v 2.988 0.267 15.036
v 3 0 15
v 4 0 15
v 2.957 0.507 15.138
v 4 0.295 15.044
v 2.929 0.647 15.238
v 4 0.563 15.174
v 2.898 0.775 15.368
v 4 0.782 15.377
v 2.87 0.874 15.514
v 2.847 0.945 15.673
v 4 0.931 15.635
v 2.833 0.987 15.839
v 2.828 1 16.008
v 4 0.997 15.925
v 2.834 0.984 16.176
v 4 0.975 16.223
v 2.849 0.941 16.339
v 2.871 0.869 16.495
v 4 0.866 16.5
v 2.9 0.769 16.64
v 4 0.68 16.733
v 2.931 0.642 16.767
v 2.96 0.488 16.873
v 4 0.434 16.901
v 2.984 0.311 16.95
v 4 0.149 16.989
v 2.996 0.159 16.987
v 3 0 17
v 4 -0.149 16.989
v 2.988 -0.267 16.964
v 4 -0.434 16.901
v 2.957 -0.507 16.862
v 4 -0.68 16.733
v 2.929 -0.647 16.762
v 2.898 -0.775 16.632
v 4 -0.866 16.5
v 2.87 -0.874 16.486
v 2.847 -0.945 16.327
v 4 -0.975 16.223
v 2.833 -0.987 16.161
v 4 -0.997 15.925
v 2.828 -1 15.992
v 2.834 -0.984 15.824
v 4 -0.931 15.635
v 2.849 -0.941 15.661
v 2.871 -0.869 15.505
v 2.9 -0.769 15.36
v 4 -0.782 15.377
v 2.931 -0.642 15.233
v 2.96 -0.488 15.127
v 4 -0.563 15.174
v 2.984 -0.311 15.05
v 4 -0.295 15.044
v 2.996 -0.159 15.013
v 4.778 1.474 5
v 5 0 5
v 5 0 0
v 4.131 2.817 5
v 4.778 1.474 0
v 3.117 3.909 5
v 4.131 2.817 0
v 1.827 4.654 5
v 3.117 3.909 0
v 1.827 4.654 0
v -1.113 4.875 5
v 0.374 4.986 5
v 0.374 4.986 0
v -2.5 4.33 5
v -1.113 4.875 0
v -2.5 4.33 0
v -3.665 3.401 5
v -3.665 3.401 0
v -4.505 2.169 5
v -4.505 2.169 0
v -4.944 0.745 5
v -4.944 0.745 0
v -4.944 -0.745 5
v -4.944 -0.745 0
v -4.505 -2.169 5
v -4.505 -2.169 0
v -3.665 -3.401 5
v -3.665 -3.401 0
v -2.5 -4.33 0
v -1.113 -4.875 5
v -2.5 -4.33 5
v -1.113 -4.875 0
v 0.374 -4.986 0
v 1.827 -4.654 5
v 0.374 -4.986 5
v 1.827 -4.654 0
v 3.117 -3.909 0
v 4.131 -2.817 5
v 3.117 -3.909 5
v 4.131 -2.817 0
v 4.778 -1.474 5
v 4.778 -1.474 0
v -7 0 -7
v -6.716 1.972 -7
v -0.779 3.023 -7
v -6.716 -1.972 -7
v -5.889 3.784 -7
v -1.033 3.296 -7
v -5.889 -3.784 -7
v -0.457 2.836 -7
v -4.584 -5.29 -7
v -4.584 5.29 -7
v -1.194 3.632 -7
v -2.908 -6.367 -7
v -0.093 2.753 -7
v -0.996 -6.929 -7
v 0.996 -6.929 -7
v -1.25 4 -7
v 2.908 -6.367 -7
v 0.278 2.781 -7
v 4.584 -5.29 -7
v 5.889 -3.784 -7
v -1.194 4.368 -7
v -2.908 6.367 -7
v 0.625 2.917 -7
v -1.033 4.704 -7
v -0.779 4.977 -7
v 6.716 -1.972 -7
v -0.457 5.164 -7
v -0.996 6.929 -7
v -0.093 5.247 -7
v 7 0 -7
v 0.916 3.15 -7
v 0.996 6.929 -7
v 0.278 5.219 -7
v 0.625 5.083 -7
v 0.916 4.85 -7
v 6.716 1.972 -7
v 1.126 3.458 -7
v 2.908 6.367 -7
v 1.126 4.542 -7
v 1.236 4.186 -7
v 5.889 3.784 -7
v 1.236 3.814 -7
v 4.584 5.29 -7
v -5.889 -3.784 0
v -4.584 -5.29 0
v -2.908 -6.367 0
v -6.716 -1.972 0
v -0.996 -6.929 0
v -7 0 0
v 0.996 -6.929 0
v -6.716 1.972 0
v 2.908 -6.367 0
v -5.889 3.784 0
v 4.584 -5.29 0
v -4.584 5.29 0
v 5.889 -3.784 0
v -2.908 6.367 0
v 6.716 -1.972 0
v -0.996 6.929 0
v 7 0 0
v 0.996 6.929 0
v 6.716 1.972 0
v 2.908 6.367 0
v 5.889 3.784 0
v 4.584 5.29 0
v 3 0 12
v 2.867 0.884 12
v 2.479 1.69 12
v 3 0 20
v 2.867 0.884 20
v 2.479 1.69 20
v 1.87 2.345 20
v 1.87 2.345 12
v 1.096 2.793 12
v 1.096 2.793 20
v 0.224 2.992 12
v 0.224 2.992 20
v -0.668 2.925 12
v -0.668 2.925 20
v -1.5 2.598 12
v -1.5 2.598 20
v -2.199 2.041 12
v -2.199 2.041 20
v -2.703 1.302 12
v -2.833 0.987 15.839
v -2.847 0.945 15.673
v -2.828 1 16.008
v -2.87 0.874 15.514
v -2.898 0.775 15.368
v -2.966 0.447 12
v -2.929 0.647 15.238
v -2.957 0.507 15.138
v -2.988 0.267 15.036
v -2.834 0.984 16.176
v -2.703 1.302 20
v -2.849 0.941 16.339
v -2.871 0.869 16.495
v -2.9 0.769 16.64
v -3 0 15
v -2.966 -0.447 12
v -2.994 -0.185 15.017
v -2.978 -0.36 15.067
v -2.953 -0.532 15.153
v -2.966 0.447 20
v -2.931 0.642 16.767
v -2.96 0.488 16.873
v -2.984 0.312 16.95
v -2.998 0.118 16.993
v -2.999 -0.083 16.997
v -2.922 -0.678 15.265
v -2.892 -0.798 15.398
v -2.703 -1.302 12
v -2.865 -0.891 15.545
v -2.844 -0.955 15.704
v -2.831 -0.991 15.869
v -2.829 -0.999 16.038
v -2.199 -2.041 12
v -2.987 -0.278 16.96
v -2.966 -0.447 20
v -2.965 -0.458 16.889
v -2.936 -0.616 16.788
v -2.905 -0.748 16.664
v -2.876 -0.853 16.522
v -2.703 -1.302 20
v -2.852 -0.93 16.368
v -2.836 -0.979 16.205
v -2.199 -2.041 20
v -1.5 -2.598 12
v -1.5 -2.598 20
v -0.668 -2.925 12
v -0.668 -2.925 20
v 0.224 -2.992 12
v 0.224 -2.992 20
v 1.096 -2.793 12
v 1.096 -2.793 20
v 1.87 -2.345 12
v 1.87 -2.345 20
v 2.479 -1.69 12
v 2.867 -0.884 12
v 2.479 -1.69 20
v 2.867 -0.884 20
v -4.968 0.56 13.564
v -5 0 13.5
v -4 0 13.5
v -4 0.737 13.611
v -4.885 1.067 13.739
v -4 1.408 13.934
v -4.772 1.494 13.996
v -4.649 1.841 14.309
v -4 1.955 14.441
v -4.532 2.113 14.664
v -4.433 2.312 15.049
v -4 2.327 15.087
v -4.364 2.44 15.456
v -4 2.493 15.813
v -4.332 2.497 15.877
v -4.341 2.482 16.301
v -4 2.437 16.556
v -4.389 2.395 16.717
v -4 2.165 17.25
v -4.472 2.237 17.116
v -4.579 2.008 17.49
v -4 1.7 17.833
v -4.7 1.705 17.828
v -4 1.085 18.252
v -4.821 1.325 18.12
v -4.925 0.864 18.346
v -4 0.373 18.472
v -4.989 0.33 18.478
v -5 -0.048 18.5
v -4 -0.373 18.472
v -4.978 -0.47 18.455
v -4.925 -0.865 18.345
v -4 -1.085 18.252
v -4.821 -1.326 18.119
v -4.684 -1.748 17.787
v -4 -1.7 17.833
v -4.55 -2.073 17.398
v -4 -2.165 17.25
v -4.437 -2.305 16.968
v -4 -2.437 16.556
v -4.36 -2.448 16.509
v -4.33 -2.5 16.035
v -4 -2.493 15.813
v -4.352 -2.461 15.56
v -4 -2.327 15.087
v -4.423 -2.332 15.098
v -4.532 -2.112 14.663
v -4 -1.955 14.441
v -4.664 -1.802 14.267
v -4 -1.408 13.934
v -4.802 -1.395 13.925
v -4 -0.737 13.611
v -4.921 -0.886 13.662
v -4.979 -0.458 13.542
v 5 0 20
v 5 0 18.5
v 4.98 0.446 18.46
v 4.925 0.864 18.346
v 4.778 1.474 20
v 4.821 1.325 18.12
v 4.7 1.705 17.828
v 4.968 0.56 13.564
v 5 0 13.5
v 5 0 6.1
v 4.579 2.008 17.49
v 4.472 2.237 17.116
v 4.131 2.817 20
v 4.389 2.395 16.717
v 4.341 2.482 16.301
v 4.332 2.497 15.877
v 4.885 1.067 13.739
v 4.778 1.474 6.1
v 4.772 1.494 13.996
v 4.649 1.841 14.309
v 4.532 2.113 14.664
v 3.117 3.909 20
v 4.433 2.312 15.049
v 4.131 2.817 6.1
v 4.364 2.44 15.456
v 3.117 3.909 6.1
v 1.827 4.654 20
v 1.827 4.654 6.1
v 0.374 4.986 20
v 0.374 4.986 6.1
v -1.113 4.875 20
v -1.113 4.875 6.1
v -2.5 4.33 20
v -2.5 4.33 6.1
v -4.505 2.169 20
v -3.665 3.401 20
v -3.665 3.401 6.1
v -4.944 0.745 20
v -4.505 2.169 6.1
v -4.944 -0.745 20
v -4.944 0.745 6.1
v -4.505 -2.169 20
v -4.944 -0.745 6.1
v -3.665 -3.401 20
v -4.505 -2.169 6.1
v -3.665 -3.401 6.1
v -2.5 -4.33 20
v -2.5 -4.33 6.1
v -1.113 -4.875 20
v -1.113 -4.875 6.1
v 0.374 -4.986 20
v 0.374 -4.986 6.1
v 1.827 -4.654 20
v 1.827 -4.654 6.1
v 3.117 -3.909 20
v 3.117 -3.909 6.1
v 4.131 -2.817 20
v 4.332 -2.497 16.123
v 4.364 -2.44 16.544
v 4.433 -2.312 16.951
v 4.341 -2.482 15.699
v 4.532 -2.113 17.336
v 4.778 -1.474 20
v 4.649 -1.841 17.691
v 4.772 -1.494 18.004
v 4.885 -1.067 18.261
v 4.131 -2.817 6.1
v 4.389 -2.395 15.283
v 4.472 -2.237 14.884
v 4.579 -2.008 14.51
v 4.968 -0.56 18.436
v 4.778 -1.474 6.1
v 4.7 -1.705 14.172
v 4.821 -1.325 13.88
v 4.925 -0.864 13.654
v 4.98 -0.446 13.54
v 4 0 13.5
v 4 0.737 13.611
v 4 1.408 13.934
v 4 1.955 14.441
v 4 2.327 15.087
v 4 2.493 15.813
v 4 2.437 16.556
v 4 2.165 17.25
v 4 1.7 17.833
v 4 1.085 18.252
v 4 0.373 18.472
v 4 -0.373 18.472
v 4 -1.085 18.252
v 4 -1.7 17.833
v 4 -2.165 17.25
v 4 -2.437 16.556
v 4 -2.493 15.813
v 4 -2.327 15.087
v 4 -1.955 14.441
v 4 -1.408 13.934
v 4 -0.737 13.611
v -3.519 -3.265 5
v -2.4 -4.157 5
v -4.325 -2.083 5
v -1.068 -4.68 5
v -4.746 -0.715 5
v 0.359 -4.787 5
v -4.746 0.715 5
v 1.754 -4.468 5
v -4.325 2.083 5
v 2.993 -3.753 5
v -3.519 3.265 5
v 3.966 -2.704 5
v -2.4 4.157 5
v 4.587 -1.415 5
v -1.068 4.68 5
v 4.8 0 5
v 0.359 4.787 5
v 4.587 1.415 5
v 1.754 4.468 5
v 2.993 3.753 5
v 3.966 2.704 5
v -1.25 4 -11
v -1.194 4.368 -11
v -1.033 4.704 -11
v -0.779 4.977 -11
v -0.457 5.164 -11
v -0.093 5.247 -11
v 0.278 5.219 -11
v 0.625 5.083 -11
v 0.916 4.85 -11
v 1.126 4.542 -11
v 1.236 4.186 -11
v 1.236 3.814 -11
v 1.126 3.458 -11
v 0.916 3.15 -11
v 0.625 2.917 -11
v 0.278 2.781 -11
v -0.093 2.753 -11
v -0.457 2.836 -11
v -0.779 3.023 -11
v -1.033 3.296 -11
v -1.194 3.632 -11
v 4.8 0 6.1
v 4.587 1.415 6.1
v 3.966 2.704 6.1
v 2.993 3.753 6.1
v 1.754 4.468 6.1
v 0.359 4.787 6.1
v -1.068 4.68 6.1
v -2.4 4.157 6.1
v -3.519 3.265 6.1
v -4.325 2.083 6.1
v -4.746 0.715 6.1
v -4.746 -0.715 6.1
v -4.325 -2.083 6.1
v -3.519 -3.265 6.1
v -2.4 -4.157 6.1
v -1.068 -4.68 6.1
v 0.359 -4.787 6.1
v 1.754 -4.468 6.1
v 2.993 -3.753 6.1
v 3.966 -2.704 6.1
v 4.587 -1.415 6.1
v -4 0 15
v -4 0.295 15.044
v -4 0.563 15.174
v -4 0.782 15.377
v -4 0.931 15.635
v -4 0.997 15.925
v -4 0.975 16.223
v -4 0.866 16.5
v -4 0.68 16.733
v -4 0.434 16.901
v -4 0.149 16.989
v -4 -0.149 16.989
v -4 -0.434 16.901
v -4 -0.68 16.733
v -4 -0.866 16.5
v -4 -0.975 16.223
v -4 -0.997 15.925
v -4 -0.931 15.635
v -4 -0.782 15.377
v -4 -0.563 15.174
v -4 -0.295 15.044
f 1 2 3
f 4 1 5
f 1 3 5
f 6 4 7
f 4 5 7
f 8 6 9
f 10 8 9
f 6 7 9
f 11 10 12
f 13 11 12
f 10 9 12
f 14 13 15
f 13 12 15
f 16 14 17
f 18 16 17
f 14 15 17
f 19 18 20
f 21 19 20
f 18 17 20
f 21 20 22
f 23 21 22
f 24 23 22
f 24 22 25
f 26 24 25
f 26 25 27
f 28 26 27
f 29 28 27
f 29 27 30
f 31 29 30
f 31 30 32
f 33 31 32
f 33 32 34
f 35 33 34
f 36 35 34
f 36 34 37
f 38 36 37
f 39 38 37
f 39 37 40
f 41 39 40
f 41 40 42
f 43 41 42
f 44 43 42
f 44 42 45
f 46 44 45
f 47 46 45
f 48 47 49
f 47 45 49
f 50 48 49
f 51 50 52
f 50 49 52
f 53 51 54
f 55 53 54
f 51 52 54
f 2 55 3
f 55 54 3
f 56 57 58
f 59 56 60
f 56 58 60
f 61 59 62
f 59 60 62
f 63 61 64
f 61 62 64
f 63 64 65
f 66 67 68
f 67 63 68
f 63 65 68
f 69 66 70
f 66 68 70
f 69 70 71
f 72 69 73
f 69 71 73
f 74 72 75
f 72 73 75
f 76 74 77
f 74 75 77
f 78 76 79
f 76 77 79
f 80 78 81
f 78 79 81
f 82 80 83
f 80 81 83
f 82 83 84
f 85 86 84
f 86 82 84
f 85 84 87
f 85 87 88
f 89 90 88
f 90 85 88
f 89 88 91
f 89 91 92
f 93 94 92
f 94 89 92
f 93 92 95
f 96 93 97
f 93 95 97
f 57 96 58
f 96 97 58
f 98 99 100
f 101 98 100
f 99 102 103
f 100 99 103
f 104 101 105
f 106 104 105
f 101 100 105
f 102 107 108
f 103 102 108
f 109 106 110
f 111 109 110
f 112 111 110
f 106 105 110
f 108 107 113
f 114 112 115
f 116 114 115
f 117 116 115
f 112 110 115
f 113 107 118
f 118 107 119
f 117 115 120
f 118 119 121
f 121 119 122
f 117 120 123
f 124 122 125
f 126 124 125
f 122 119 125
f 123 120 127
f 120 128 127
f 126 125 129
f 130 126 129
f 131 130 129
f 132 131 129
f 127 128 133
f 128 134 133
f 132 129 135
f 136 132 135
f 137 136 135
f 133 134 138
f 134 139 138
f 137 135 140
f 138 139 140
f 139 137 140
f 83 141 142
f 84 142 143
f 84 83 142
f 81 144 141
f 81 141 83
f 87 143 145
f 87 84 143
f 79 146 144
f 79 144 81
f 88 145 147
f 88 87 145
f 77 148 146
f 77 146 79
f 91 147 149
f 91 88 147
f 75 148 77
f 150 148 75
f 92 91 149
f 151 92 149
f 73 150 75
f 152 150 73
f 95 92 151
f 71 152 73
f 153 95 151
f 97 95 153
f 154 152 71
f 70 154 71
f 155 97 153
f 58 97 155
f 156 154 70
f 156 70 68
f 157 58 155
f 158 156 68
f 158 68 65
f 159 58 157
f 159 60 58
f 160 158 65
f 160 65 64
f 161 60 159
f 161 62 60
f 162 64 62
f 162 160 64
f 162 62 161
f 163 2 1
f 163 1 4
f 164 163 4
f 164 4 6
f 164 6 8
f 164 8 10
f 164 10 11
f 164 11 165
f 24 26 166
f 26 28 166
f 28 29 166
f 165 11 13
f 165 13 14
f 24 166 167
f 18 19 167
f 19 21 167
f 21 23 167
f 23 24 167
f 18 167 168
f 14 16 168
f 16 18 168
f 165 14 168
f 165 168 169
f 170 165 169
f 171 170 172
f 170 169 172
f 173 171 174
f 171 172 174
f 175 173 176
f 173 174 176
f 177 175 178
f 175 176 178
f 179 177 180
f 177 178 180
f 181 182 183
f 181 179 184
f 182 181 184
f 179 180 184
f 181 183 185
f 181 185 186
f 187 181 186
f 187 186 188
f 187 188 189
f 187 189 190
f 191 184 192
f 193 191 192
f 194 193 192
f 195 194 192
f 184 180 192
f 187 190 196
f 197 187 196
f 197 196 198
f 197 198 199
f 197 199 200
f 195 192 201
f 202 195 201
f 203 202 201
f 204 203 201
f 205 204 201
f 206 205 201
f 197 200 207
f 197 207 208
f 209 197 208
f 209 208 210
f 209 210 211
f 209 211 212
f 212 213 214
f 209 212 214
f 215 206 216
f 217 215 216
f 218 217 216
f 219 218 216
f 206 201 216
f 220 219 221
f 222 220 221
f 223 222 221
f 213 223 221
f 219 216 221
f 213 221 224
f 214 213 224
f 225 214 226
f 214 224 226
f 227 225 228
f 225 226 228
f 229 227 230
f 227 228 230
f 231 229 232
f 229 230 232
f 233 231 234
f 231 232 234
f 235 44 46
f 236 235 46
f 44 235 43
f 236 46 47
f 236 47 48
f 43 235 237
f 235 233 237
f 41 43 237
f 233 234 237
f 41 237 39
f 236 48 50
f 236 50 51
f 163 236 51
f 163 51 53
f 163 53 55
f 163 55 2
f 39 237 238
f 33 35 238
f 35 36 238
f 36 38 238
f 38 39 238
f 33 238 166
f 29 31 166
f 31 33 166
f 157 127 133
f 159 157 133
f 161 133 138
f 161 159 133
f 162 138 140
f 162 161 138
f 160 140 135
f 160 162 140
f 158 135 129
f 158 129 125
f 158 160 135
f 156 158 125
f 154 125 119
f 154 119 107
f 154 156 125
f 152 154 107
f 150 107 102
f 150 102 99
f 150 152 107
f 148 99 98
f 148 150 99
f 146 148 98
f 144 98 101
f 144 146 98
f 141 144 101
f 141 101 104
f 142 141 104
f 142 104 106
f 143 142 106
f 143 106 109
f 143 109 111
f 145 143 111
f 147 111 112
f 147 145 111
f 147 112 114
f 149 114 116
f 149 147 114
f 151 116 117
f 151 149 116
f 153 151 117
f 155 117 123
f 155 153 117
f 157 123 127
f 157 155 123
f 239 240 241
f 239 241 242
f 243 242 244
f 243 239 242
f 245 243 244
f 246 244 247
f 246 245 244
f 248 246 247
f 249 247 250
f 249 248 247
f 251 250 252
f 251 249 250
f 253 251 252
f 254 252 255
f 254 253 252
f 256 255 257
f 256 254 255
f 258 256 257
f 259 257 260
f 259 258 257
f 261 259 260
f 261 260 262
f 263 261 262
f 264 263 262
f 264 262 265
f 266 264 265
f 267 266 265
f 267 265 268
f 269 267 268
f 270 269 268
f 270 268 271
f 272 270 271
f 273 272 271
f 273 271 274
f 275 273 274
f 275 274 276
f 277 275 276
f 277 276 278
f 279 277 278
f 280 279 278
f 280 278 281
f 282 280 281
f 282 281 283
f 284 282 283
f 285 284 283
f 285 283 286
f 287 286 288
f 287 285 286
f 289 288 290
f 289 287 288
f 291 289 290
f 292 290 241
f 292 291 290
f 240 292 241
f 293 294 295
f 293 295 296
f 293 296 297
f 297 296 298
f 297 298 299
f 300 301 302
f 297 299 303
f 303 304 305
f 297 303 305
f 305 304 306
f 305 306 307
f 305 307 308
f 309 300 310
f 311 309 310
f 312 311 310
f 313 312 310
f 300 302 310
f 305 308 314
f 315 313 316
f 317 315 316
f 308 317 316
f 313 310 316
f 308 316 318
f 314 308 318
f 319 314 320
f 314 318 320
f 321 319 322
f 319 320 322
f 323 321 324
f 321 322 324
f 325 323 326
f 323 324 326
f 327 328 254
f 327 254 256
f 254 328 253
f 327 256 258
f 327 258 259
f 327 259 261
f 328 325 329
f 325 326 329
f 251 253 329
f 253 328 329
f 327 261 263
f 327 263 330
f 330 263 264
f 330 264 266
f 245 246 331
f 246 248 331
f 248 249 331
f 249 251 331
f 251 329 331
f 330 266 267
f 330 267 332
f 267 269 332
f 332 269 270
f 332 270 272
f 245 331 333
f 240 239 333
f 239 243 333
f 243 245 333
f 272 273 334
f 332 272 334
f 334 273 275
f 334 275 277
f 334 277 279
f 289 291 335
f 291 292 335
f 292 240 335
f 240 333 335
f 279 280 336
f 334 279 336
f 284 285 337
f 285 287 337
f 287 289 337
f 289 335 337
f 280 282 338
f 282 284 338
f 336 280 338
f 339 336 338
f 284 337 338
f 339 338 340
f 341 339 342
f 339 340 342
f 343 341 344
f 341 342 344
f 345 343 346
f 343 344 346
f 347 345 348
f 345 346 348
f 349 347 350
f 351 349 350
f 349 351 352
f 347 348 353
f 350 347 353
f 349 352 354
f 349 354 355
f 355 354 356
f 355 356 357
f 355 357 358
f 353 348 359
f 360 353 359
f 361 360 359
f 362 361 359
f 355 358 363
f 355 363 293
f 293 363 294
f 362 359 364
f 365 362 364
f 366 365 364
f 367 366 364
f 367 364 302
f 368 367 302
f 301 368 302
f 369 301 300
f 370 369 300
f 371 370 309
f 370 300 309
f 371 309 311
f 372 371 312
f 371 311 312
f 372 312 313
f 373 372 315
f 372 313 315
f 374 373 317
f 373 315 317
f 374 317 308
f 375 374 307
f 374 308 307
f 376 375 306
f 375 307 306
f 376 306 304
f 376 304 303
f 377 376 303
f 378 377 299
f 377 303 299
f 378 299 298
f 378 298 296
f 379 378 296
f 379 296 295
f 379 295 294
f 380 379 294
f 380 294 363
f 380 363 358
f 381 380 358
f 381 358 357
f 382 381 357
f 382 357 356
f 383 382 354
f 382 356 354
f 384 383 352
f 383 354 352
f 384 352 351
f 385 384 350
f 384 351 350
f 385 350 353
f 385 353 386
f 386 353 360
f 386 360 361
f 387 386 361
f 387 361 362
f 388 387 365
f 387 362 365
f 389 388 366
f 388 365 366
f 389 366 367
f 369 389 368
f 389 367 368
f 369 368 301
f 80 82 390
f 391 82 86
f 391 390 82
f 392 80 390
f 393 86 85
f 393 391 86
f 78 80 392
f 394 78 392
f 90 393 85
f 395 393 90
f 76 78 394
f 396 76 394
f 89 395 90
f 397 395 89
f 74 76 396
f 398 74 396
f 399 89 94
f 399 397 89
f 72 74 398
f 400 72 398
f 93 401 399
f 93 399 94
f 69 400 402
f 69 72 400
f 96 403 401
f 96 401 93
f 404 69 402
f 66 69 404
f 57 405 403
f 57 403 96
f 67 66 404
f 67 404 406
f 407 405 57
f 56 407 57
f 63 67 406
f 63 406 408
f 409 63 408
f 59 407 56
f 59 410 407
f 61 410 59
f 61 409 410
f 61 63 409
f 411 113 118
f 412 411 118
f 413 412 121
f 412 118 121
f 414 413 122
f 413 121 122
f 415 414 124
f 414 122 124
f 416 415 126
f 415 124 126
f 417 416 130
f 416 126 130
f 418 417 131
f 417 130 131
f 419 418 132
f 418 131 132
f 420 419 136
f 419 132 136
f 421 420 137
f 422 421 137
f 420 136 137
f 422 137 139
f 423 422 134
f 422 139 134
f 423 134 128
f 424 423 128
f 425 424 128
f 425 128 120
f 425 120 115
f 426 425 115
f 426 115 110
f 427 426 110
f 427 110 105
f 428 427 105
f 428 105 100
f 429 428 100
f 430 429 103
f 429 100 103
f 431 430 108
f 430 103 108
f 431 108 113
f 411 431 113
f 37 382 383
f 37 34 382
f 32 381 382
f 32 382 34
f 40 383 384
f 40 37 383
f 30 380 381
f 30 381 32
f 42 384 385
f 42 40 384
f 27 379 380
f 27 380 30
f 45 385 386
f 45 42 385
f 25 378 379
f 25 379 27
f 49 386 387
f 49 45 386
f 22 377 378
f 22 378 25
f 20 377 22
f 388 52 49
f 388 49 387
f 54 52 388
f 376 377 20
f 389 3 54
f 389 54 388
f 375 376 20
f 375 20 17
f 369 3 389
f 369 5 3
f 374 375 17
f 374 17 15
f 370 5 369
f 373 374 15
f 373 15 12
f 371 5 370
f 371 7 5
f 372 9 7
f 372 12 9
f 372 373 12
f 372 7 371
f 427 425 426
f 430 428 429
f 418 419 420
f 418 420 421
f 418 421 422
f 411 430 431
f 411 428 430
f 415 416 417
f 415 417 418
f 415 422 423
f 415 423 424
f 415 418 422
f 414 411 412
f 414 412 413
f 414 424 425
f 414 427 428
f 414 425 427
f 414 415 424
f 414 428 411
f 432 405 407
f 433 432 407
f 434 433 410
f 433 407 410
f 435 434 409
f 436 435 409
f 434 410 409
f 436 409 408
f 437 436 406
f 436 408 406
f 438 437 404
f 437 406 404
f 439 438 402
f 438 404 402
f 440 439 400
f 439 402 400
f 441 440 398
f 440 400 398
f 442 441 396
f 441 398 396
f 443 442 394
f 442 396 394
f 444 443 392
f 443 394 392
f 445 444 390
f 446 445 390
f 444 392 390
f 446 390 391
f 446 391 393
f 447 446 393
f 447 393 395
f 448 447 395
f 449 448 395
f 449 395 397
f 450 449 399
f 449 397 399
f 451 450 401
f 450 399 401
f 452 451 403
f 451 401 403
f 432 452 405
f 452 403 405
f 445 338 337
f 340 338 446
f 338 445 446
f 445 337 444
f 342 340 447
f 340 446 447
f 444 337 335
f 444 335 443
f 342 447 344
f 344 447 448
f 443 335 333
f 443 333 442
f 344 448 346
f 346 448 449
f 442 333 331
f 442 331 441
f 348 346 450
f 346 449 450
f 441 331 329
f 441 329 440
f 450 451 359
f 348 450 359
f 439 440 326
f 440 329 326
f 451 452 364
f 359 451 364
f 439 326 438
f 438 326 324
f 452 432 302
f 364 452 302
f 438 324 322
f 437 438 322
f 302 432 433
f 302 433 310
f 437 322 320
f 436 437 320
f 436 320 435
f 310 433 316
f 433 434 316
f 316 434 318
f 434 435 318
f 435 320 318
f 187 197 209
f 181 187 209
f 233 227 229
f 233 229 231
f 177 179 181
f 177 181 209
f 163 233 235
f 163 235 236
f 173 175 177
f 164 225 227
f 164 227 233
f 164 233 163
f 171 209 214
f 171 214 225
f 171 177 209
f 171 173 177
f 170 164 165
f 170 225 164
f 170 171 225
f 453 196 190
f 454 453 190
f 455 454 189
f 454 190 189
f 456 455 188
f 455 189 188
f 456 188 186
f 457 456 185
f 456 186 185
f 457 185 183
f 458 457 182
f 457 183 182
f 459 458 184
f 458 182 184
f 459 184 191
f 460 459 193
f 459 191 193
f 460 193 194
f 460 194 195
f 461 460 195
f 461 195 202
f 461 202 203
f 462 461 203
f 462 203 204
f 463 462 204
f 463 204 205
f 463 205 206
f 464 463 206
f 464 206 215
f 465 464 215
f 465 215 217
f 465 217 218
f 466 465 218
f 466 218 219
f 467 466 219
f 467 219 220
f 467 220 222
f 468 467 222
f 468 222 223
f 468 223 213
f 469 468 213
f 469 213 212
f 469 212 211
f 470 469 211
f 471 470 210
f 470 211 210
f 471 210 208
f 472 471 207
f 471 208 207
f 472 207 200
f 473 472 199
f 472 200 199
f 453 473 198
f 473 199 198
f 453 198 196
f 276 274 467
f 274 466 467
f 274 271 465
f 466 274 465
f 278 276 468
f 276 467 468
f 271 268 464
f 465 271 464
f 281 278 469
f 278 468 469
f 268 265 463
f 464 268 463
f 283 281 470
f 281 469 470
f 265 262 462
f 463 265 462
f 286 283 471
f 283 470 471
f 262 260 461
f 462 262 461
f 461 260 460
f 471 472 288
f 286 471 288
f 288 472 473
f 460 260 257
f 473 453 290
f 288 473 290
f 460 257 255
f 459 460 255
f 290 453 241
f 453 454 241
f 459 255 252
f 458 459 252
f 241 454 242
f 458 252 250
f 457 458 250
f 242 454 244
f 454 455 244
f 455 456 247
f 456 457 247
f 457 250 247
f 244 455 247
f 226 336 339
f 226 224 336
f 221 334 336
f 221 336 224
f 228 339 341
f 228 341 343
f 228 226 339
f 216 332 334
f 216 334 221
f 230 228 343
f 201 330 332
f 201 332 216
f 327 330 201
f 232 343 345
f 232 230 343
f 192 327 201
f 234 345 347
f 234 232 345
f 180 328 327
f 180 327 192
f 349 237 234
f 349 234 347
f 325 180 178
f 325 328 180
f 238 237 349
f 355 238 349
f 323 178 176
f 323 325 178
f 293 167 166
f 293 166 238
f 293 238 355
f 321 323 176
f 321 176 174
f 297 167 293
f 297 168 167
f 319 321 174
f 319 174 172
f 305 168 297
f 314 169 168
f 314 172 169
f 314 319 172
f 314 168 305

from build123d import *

# Parameters (mm, degrees)
SKETCH1_R           = 7
BOSS_EXTRUDE1_DEPTH = 7
SKETCH2_R           = 5
BOSS_EXTRUDE2_DEPTH = 20
SKETCH3_R           = 6
SKETCH3_R_2         = 4.8
CUT_EXTRUDE1_DEPTH  = 1.1
SKETCH4_R           = 1.25
BOSS_EXTRUDE3_DEPTH = 4
SKETCH5_R           = 1
CUT_EXTRUDE2_DEPTH  = 13
SKETCH6_R           = 2.5
CUT_EXTRUDE3_DEPTH  = 1
SKETCH7_R           = 3
CUT_EXTRUDE4_DEPTH  = 8


with BuildPart() as part:
    # Sketch1 → Boss-Extrude1 (new body)
    with BuildSketch(Plane.XY):
        Circle(SKETCH1_R)
    extrude(amount=-BOSS_EXTRUDE1_DEPTH)

    # Sketch2 → Boss-Extrude2 (add)
    with BuildSketch(Plane.XY):
        Circle(SKETCH2_R)
    extrude(amount=BOSS_EXTRUDE2_DEPTH)

    # Sketch3 → Cut-Extrude1 (cut)
    with BuildSketch(Plane.XY.offset(5)):
        Circle(SKETCH3_R)
        Circle(SKETCH3_R_2, mode=Mode.SUBTRACT)
    extrude(amount=CUT_EXTRUDE1_DEPTH, mode=Mode.SUBTRACT)

    # Sketch4 → Boss-Extrude3 (add)
    with BuildSketch(Plane(origin=(0, 0, -7), x_dir=(-1, 0, 0), z_dir=(0, 0, -1))):
        with Locations((0, 4)):
            Circle(SKETCH4_R)
    extrude(amount=BOSS_EXTRUDE3_DEPTH)

    # Sketch5 → Cut-Extrude2 (cut, through all)
    with BuildSketch(Plane(origin=(5, 0, 0), x_dir=(0, 0, -1), z_dir=(1, 0, 0))):
        with Locations((-16, 0)):
            Circle(SKETCH5_R)
    extrude(amount=-CUT_EXTRUDE2_DEPTH, mode=Mode.SUBTRACT)

    # Sketch6 → Cut-Extrude3 (cut)
    with BuildSketch(Plane(origin=(5, 0, 0), x_dir=(0, 0, -1), z_dir=(1, 0, 0))):
        with Locations((-16, 0)):
            Circle(SKETCH6_R)
    cut_extrude3 = extrude(amount=-CUT_EXTRUDE3_DEPTH, mode=Mode.SUBTRACT)

    # Mirror1: Cut-Extrude3 across plane
    add(cut_extrude3.mirror(Plane(origin=(0, 0, 0), x_dir=(0, 0, 1), z_dir=(1, 0, 0))), mode=Mode.SUBTRACT)

    # Sketch7 → Cut-Extrude4 (cut)
    with BuildSketch(Plane.XY.offset(20)):
        Circle(SKETCH7_R)
    extrude(amount=-CUT_EXTRUDE4_DEPTH, mode=Mode.SUBTRACT)


solid = part.part
